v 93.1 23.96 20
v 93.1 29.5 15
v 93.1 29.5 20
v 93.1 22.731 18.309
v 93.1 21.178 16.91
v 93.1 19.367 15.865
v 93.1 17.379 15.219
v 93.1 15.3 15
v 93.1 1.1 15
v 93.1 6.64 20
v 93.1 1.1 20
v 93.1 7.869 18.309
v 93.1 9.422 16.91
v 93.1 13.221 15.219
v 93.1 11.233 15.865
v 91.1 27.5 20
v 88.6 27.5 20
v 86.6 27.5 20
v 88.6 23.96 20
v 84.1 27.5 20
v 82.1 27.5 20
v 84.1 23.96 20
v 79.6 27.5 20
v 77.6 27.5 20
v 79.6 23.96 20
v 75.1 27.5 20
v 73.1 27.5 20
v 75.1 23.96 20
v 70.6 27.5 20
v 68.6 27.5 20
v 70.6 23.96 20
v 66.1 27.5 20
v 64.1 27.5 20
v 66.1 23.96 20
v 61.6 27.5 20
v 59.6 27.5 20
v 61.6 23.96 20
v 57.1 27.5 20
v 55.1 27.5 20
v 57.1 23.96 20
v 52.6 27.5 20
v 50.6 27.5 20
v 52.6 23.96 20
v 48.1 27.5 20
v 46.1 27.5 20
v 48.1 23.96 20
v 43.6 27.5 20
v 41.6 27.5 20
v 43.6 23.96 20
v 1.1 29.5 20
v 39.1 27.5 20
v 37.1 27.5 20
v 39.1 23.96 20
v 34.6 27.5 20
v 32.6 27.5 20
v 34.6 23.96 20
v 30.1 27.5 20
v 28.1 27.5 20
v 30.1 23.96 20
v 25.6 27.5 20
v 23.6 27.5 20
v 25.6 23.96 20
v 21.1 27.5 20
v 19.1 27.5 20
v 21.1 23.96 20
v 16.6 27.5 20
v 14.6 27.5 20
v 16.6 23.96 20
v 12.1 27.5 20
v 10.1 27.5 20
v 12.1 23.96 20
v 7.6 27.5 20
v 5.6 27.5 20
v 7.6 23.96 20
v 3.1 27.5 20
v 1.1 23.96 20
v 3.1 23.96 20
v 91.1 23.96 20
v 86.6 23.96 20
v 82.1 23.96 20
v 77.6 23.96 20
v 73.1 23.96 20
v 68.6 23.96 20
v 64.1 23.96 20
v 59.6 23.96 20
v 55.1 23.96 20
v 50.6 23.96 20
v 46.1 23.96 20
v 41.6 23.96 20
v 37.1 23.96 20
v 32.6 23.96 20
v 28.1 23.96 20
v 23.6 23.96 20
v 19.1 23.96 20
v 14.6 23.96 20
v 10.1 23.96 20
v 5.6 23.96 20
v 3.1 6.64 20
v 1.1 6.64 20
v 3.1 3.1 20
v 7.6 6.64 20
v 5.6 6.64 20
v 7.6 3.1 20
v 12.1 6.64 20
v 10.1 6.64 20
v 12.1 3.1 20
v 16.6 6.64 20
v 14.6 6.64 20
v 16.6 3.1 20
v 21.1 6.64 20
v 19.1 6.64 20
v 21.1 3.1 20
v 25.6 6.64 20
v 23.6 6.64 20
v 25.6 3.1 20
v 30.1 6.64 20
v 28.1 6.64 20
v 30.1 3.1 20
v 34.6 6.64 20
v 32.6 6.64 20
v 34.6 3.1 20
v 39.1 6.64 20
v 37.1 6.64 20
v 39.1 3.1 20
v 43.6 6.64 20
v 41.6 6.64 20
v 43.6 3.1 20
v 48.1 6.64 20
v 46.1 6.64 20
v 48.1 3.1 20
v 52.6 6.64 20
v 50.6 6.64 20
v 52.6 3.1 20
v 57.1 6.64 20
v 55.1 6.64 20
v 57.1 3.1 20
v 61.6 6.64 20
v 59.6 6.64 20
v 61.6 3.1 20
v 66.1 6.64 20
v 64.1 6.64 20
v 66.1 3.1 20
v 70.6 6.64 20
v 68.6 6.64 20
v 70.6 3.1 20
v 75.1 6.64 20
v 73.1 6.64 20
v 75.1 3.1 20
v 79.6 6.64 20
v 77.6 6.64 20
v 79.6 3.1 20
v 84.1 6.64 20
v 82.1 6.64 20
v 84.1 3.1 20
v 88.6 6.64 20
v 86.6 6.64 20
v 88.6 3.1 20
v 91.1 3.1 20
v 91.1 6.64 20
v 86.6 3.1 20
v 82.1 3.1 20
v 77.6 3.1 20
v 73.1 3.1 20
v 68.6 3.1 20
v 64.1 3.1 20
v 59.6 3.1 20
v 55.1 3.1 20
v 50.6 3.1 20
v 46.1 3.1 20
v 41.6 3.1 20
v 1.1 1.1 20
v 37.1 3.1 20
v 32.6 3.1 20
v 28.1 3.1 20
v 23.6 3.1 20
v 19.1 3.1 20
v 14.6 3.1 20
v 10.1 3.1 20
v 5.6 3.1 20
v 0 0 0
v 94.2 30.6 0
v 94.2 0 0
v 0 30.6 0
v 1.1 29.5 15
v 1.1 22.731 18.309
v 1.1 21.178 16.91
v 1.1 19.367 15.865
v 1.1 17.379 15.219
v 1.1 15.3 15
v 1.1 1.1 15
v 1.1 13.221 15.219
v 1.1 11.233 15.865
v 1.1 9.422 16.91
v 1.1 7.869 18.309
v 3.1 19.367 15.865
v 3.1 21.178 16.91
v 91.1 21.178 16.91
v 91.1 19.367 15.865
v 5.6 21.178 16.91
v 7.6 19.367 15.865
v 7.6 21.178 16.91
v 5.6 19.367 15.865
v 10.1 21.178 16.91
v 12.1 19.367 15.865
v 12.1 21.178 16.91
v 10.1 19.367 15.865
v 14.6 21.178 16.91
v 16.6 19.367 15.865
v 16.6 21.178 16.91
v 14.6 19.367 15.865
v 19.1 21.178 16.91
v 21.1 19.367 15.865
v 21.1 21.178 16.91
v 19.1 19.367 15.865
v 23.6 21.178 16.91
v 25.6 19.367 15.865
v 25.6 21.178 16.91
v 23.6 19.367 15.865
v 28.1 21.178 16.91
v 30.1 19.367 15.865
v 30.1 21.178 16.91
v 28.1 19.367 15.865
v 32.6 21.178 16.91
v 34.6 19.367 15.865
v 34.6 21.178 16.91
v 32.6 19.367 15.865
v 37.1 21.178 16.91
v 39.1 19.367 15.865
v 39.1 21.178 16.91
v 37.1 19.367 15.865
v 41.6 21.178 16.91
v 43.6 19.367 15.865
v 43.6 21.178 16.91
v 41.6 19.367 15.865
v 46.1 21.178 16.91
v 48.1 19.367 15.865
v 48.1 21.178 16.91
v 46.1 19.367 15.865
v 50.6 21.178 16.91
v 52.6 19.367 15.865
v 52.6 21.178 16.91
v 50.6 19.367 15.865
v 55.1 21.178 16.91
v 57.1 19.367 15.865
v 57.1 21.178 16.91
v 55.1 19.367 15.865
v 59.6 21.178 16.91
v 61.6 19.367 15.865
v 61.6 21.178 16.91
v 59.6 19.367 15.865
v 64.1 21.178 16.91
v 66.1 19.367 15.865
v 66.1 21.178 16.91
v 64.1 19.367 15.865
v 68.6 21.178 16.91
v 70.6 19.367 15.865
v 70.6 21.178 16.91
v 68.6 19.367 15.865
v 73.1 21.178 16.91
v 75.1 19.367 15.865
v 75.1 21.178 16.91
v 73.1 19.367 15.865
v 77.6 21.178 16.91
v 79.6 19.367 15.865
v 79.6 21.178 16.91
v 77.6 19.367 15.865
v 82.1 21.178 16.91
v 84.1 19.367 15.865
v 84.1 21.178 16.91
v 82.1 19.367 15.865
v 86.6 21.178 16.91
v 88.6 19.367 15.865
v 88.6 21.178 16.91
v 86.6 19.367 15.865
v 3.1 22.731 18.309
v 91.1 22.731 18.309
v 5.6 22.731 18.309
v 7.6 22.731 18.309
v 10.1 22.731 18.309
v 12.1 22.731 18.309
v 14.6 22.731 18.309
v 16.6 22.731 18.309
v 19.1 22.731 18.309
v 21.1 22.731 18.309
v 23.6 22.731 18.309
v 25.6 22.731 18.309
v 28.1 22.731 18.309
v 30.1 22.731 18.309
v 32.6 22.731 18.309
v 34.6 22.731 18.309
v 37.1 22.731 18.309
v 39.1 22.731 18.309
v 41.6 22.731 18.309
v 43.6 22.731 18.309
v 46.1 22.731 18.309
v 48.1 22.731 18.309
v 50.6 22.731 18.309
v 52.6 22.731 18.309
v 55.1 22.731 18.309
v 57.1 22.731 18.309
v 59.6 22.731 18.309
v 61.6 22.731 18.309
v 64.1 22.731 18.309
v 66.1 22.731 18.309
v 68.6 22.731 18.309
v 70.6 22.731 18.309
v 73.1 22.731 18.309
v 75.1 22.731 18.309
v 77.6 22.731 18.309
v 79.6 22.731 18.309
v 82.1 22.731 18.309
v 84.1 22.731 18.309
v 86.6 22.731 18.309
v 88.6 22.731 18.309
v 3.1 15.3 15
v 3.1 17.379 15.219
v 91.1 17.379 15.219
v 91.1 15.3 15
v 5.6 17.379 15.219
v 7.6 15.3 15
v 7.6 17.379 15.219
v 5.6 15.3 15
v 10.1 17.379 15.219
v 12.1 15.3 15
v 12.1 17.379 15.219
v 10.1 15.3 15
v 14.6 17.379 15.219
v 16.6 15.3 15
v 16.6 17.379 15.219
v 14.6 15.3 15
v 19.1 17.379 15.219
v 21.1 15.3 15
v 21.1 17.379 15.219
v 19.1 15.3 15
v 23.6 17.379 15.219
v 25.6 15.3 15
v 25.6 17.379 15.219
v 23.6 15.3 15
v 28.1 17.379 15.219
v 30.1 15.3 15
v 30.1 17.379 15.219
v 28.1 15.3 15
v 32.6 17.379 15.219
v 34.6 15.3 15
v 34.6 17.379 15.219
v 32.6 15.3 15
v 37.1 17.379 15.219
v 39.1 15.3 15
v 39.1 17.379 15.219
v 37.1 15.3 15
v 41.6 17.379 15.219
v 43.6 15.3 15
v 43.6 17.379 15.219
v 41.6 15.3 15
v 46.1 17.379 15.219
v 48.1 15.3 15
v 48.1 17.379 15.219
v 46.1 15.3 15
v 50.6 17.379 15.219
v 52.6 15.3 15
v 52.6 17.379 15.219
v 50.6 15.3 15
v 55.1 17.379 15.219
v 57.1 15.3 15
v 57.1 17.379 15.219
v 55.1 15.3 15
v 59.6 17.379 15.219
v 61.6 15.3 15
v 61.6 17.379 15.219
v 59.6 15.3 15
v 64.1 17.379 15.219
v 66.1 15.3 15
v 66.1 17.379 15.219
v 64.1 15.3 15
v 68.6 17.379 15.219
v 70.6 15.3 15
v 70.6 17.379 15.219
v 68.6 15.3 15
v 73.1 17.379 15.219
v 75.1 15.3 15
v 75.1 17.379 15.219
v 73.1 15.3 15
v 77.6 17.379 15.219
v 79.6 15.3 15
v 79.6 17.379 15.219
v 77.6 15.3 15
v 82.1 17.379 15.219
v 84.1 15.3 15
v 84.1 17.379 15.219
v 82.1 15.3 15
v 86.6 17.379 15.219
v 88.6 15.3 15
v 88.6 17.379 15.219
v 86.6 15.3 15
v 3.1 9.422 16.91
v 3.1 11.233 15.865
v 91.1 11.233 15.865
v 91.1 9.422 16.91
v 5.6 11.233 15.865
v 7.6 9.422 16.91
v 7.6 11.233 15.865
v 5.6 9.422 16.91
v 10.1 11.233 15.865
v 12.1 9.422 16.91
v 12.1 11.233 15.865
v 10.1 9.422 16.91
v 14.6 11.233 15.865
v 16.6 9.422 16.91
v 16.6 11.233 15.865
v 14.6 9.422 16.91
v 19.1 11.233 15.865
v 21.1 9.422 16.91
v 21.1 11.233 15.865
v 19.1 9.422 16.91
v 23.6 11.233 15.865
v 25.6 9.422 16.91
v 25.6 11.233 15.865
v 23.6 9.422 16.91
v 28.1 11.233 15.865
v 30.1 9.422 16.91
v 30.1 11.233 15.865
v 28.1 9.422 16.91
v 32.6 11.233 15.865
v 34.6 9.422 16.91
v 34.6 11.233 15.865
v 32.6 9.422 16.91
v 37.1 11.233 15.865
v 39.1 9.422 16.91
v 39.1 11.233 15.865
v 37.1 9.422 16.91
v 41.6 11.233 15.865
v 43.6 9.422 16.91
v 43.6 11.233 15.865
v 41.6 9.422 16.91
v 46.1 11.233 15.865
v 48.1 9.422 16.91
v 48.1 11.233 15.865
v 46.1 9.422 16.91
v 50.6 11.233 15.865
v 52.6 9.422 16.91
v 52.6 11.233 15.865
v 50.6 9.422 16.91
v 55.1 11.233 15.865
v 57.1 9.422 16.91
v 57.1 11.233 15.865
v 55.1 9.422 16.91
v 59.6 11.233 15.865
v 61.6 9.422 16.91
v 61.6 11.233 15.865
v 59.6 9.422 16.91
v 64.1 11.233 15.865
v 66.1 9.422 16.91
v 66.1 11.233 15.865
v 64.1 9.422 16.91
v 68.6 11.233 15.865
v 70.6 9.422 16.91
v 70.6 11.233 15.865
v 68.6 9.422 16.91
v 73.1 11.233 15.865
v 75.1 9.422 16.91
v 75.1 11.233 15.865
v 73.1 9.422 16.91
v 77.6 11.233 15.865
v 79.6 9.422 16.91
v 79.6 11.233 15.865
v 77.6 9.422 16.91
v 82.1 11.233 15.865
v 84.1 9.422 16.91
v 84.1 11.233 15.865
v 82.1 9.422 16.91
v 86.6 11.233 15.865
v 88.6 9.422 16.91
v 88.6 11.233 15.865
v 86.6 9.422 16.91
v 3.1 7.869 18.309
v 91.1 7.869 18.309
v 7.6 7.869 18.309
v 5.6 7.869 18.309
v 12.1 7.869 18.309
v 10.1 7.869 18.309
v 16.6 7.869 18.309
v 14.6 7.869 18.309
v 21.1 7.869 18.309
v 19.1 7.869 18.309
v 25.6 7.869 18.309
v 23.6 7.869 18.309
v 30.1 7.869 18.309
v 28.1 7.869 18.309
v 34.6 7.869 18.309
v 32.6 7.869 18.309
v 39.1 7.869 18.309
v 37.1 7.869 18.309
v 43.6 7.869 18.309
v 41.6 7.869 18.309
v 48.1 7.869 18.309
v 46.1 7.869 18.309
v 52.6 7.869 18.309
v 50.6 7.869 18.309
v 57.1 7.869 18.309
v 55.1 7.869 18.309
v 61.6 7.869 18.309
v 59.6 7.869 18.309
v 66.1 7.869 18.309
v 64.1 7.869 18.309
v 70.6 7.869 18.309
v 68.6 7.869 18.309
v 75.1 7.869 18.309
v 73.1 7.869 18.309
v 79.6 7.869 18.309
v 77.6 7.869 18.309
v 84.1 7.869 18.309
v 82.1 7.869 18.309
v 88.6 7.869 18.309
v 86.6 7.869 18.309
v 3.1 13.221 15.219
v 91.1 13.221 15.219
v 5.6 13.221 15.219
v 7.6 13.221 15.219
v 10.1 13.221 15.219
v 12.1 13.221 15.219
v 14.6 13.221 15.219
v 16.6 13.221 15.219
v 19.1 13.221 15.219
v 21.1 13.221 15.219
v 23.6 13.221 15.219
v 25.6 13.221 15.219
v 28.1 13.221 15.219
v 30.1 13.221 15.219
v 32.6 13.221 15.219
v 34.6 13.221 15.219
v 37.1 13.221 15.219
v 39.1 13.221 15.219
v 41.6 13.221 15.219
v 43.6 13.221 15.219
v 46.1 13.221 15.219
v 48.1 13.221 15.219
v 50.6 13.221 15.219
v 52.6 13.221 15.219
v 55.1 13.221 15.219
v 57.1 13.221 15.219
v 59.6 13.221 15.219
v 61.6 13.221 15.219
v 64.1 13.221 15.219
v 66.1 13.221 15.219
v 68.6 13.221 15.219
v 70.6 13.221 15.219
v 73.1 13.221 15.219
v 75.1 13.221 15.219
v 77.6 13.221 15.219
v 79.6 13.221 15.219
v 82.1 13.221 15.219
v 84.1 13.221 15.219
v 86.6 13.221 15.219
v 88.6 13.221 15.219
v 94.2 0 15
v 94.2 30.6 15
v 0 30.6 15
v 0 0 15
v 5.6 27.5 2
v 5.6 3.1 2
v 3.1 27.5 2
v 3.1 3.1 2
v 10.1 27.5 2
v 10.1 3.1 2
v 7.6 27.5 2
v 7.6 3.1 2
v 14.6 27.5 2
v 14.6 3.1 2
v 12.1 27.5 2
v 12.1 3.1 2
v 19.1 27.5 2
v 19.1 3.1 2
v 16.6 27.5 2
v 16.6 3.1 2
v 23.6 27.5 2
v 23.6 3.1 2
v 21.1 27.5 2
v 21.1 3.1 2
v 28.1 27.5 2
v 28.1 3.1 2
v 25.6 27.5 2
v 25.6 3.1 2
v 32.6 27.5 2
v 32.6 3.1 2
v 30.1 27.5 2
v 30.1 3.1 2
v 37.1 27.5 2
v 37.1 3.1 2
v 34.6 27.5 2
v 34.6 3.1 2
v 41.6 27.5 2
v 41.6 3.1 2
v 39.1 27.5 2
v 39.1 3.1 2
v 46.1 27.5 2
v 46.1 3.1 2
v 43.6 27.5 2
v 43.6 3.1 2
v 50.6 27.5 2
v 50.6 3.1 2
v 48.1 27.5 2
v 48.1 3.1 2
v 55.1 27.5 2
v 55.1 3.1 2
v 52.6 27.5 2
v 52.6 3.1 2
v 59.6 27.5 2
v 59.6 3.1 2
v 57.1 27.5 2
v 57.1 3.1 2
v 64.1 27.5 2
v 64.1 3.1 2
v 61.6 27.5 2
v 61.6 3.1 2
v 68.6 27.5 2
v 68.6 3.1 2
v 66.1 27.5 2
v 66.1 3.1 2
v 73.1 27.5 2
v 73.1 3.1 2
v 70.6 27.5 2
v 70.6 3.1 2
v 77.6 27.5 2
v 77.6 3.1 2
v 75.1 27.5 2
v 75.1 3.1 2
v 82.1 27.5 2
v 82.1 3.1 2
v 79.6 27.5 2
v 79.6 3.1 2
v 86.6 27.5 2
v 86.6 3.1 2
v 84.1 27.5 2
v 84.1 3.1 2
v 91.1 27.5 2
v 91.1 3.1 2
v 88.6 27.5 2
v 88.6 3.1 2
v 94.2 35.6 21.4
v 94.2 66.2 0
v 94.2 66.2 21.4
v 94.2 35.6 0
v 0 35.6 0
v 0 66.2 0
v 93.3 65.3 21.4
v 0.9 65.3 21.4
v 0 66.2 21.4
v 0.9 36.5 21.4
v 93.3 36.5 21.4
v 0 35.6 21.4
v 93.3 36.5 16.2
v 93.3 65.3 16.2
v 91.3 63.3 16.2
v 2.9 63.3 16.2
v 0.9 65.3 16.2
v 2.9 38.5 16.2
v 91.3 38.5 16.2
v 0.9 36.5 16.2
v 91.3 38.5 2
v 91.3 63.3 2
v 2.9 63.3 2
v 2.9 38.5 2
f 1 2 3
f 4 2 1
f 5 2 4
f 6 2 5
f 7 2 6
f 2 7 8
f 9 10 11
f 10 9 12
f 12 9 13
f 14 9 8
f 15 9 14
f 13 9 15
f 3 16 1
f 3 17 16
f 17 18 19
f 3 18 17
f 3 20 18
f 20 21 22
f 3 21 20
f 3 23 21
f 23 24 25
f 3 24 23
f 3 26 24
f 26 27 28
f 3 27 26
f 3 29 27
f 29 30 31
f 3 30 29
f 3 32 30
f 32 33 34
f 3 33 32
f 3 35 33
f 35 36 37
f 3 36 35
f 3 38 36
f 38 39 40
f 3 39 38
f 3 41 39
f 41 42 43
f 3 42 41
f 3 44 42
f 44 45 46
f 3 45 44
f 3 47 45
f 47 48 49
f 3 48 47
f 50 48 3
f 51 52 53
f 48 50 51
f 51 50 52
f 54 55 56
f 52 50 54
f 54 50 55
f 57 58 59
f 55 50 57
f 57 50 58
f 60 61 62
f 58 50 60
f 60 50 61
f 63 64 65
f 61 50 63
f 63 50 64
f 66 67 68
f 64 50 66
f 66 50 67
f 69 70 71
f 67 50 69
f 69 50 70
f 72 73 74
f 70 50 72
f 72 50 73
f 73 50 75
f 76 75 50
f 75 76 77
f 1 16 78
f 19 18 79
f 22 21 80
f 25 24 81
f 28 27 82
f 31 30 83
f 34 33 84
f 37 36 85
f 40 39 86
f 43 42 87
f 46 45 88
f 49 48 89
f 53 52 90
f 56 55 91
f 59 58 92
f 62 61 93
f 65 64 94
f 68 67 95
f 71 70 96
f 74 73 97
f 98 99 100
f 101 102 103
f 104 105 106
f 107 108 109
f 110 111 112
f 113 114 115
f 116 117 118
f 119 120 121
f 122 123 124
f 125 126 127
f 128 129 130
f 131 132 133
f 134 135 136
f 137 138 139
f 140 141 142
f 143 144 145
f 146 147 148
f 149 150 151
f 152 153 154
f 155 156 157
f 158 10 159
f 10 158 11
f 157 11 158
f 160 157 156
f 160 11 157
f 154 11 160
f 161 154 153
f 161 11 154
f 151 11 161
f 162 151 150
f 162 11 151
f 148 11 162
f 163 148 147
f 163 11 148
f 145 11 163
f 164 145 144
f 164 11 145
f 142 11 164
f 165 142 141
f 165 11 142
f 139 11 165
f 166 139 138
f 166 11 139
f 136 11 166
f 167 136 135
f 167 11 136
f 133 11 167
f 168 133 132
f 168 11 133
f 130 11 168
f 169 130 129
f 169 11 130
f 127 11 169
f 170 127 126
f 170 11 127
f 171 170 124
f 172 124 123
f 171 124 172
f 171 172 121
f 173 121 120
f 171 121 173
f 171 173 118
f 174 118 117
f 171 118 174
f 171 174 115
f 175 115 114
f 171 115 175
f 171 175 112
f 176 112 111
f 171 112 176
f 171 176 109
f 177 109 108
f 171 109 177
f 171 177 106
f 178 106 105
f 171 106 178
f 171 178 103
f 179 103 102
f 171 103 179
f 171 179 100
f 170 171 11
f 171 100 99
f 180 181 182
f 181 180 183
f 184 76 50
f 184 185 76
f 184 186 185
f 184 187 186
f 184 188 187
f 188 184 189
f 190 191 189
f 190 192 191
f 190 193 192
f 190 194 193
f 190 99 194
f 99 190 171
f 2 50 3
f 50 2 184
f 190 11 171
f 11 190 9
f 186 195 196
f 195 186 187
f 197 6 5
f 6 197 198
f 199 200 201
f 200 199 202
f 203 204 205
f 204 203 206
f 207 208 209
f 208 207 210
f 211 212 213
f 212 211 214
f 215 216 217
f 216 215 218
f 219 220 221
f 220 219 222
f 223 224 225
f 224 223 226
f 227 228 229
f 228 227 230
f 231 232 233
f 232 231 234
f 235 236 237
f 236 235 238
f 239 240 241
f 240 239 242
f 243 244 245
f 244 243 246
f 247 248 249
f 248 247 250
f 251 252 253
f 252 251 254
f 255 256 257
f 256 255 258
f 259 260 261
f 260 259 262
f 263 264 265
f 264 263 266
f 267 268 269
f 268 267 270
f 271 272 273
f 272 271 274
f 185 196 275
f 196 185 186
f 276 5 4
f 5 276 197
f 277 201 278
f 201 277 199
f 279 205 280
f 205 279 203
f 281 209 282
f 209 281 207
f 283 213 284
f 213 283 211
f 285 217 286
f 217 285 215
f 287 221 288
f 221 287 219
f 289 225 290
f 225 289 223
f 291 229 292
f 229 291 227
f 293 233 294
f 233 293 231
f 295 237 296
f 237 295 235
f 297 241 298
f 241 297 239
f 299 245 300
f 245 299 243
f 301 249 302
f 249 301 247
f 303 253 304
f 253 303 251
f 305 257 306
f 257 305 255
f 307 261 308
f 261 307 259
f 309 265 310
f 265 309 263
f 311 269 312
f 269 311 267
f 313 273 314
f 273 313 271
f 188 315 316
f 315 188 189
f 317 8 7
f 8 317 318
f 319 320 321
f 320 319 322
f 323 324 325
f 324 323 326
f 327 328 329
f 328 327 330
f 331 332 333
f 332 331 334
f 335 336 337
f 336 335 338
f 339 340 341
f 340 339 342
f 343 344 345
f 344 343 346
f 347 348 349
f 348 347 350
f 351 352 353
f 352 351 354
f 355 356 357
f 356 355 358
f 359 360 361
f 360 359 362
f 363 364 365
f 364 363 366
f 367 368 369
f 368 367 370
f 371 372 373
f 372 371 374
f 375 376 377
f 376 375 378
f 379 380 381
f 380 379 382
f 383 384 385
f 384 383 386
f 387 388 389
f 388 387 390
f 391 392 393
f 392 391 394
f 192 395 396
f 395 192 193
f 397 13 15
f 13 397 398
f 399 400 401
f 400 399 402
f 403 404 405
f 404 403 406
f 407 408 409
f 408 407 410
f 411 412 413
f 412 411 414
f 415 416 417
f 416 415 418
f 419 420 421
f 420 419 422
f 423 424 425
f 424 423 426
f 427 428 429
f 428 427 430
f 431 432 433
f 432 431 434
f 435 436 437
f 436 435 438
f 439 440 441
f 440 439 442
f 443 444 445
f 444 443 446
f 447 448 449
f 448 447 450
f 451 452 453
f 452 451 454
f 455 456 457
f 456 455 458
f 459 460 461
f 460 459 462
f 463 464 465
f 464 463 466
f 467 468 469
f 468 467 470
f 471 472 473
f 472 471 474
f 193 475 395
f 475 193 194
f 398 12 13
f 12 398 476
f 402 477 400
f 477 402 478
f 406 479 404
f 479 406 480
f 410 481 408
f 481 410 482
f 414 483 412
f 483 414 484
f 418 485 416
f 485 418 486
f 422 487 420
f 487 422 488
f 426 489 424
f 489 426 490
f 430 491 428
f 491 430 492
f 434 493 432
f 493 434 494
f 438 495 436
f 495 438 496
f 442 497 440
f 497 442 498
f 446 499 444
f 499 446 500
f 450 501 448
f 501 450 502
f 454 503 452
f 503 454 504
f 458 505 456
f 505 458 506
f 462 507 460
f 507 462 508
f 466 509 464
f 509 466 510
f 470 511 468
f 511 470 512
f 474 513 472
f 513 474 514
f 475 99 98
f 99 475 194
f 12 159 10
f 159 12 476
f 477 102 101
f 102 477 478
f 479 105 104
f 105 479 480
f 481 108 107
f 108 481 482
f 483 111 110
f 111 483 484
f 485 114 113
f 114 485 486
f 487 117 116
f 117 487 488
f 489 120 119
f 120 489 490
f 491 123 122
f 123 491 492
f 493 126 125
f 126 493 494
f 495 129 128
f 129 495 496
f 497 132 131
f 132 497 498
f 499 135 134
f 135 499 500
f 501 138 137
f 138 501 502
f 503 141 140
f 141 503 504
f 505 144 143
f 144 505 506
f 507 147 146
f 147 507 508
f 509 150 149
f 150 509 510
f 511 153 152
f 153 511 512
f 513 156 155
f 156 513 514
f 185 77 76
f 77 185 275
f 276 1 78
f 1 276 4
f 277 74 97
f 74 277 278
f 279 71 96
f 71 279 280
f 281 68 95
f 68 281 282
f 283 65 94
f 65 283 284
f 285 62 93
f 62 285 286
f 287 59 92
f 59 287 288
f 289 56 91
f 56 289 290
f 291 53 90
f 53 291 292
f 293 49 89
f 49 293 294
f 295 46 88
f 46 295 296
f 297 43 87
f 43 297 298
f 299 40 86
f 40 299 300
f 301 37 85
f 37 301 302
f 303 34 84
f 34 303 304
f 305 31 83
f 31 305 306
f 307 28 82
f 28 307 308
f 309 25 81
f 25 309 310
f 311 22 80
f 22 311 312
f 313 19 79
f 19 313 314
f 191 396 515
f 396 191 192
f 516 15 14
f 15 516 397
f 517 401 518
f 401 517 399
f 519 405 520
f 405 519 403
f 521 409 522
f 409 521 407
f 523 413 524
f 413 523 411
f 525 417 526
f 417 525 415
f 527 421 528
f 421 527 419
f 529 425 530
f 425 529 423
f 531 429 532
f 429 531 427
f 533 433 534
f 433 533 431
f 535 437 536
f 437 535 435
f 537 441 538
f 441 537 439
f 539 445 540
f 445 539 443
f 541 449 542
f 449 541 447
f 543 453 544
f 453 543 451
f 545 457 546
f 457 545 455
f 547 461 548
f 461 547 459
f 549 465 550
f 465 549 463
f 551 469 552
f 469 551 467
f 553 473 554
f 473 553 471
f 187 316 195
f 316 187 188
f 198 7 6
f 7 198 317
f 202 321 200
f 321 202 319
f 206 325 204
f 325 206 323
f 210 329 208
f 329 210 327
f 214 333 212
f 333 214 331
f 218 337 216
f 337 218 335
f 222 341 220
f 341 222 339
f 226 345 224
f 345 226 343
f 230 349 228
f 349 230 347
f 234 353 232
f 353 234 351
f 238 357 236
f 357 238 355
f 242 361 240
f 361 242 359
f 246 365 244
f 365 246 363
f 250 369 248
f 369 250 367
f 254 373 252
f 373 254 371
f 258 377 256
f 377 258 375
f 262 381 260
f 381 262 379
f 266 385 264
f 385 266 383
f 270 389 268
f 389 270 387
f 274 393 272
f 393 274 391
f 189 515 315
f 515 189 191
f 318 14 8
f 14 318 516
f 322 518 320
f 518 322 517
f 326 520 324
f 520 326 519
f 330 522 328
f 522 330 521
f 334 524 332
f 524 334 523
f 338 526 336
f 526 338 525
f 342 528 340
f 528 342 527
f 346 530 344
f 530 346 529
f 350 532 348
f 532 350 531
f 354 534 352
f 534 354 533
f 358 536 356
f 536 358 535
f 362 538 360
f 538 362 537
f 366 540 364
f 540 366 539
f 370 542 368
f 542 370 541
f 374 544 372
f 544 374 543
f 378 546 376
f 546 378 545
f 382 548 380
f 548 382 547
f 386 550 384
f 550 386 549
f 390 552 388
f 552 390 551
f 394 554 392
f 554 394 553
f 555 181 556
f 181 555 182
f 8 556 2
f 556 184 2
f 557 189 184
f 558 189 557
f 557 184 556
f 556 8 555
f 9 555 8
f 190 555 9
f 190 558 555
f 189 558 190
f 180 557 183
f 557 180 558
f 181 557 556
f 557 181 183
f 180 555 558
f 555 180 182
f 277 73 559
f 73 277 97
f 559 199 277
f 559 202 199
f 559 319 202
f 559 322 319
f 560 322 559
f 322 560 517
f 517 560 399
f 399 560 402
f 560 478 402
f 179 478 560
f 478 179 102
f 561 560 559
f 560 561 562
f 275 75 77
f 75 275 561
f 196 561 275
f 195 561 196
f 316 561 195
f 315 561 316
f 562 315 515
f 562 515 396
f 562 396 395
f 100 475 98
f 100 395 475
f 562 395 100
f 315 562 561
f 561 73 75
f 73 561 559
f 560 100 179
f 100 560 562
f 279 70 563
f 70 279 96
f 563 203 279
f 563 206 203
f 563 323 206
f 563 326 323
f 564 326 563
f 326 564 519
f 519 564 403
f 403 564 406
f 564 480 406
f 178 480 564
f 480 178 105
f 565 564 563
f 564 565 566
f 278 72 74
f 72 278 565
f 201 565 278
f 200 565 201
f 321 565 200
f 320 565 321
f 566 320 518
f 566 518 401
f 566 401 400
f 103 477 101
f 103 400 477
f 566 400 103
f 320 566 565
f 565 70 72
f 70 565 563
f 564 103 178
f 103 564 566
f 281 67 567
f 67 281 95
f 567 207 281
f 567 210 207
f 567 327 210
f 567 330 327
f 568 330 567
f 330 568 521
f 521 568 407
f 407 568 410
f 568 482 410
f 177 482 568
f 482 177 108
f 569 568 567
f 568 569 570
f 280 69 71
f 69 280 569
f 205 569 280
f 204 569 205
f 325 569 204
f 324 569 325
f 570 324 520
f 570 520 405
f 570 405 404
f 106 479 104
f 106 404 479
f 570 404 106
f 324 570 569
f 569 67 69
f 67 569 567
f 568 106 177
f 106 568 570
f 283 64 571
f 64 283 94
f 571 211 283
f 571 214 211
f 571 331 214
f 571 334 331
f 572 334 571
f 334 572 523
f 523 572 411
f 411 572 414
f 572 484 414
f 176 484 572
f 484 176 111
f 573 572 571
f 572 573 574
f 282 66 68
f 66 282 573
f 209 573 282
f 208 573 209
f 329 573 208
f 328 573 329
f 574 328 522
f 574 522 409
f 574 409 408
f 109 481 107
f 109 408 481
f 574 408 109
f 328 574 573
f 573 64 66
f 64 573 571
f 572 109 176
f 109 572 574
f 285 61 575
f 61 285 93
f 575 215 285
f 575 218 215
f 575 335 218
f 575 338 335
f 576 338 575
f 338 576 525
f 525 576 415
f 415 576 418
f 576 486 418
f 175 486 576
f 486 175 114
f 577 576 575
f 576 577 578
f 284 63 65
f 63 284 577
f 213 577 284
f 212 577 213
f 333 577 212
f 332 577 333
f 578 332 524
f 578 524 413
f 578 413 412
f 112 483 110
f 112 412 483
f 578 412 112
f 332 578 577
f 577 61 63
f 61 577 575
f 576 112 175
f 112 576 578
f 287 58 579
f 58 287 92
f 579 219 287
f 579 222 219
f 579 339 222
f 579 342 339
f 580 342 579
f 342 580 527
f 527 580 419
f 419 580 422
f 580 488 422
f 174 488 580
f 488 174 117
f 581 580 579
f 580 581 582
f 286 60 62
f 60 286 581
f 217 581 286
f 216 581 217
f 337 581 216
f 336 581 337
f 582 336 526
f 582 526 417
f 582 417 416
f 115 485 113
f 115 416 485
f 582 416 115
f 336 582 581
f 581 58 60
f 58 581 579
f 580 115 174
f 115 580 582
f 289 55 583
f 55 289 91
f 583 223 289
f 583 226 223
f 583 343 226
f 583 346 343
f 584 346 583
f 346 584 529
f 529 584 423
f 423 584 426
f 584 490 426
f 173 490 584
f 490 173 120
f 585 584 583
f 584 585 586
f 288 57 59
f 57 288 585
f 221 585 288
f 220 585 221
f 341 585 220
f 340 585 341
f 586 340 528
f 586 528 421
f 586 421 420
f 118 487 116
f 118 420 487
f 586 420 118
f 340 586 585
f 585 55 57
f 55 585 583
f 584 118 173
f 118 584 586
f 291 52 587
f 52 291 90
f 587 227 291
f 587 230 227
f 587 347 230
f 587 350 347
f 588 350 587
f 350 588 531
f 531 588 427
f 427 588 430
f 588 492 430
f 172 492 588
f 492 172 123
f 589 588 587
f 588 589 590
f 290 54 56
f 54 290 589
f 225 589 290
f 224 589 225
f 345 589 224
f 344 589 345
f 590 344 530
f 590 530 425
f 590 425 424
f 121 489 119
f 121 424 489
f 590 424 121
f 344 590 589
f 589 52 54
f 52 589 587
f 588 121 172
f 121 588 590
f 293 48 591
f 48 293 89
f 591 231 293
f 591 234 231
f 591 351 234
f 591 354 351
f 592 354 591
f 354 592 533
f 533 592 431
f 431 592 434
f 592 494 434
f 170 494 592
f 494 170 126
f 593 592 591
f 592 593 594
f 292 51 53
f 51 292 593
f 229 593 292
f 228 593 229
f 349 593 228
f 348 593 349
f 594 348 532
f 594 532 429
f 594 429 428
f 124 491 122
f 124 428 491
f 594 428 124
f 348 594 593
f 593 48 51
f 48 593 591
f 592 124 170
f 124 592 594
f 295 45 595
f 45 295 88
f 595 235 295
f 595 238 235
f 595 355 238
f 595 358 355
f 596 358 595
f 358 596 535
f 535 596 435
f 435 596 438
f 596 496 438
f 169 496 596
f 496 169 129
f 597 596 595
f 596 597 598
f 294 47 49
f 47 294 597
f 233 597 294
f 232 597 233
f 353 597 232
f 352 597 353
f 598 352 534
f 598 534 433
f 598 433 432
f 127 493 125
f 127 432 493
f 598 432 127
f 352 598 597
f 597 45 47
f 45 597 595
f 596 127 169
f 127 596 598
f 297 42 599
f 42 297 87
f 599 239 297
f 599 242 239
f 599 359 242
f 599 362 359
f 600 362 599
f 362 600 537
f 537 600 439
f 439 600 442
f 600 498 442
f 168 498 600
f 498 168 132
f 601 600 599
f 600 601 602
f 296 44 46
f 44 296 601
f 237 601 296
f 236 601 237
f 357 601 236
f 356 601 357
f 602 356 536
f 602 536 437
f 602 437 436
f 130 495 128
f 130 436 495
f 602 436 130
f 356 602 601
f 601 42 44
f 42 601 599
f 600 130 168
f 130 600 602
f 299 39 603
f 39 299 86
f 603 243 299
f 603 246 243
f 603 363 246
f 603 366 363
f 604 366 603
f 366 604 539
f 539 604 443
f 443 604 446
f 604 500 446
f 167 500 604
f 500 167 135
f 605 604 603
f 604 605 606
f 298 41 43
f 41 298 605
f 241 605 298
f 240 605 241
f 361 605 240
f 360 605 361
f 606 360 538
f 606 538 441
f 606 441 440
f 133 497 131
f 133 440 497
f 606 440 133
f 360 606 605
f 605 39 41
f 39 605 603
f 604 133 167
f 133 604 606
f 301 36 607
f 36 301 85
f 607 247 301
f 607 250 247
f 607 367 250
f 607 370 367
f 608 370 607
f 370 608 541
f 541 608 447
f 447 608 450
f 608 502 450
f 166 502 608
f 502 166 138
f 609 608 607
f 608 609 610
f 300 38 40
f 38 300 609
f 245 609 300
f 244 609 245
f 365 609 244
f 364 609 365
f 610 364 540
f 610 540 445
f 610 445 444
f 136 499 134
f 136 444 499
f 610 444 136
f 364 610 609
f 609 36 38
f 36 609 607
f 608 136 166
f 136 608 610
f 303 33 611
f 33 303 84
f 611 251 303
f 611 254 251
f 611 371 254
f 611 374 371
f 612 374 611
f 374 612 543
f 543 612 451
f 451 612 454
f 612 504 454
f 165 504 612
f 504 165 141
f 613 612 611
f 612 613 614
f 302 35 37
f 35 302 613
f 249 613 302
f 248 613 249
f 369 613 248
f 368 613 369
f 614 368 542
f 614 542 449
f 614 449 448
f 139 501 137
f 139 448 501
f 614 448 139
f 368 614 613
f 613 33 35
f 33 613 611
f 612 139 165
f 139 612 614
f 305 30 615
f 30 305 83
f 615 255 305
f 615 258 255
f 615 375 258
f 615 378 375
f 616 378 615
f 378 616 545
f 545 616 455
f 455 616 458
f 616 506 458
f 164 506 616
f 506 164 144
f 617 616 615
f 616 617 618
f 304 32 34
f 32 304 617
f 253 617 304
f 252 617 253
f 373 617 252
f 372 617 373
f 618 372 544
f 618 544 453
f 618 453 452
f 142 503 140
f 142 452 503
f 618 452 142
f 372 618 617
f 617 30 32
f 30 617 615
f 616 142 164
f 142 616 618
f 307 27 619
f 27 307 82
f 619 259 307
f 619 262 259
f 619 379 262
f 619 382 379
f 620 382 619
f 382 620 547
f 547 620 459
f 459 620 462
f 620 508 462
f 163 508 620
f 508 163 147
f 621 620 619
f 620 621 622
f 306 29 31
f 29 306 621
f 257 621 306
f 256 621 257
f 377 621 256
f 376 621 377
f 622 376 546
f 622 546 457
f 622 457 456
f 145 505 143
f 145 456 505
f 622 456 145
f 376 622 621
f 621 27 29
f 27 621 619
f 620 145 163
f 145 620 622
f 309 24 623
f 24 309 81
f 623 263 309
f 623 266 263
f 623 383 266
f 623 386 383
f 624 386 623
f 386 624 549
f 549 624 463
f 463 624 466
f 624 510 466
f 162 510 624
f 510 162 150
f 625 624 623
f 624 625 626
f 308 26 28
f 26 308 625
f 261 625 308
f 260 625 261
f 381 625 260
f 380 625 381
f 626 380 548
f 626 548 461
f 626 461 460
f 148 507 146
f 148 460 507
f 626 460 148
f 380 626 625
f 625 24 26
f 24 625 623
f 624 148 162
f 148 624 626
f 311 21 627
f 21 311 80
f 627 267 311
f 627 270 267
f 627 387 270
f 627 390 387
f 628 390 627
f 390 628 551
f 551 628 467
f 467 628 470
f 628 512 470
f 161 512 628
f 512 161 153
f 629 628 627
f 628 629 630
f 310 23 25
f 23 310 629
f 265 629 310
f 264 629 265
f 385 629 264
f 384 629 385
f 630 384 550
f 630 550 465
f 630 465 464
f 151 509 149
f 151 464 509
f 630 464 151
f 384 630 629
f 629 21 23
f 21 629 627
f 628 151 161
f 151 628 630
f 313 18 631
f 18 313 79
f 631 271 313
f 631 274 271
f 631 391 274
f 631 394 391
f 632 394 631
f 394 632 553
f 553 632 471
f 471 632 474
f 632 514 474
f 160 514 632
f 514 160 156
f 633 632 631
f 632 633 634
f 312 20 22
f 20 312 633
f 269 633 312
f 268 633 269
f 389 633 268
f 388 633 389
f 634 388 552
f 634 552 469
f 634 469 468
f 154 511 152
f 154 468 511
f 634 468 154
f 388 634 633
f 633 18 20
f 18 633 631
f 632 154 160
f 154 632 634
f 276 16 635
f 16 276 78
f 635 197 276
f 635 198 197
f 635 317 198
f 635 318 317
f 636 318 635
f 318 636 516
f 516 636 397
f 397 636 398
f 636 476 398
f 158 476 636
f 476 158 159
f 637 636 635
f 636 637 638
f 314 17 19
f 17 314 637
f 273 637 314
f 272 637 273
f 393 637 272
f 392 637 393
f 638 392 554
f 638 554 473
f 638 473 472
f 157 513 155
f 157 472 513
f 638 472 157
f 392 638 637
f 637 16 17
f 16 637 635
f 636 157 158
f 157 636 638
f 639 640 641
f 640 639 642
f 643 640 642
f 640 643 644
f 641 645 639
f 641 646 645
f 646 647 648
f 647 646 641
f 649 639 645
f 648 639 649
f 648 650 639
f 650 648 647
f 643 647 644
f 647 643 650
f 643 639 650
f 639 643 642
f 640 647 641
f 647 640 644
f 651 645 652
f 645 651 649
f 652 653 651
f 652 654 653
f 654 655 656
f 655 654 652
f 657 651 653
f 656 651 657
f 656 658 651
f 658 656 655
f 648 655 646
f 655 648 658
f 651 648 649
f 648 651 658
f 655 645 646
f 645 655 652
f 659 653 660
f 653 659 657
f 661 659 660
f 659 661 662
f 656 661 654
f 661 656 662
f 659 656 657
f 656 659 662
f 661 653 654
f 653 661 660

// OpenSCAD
num_cards = 20;
sdkarte_dicke = 2.5;
sdkarte_breite = 24.4;
sdkarte_hoehe = 32.4;
sdkarte_offsetx = 3.1;
sdkarte_offsety = 3.1;

mode="both"; // [base, cap, both]

module cards(){
    for(i=[0:num_cards-1]){
      translate([sdkarte_offsetx+(4.5*i),sdkarte_offsety,2]) 
      cube([sdkarte_dicke,sdkarte_breite,sdkarte_hoehe],false);
    }    
}

module base(){
    color([1,0.75,0.75])
    difference(){
        union(){
            cube([num_cards*4.5+4.2,30.6,15]);
            translate([1.1,1.1,0])
            difference () {
                cube([num_cards*4.5+2,28.4,20],false);
                translate([0,28.4/2,25])
                    rotate([0,90,0])
                        cylinder(h=num_cards*4.5+4.2, r=10, center=false);
            }
        }
        cards();
    }

}

module cap(){
    
    translate([0,30.6,21.4])
    rotate([180,0,0])
    color([0.75,0.75,1])
    // translate([0,0,35.6])
    difference(){
        cube([num_cards*4.5+4.2,30.6,21.4]);
    
        color([1,0,1])
        translate([0.9,0.9,-1])
    
        cube([num_cards*4.5+2.4,28.8,6.2]);
        
        translate([2.9,2.9,5])
        cube([num_cards*4.5-1.6,24.8,14.4]);
    }
}

if (mode=="base"){
  base();
}else if (mode =="cap"){
    cap();
}else if (mode =="both"){
    base();
    translate([0,35.6,0])
    cap();
}
